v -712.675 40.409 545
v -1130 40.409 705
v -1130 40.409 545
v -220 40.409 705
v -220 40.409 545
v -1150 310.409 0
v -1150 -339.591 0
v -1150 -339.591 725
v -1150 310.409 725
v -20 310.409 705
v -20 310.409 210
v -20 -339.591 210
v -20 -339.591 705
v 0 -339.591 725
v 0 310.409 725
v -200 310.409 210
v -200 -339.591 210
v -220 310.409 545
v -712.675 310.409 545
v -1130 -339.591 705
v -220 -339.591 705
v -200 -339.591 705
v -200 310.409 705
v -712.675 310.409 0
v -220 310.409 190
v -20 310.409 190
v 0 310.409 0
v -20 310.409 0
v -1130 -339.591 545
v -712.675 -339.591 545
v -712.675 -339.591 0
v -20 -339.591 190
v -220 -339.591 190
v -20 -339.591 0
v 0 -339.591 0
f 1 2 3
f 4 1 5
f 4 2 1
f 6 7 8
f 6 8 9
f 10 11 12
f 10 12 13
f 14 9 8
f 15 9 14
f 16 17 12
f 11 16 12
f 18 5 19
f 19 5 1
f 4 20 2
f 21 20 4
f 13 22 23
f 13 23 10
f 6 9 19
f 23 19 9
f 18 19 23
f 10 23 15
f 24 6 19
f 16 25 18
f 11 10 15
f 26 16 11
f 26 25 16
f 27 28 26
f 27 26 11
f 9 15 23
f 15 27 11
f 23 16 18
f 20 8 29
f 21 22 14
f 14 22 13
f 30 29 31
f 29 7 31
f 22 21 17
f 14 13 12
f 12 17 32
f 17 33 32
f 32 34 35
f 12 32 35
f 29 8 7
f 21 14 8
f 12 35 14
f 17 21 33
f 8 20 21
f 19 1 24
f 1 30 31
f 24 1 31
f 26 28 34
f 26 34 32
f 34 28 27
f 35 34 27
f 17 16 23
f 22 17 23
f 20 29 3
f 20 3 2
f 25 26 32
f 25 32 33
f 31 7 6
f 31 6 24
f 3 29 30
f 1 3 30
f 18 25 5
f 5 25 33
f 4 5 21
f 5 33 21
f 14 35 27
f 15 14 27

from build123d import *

# Parameters (mm, degrees)
F0_W     = 1150
F0_H     = 650
F1_DEPTH = 725
F2_W     = 180
F2_H     = 495
F3_DEPTH = 650.001
F5_DEPTH = 650.001
F6_W     = 910
F6_H     = 160
F7_DEPTH = 380


with BuildPart() as f1:
    # F0 (on Top) → F1 (new body)
    with BuildSketch(Plane.XY):
        with Locations((-575, -14.591489)):
            Rectangle(F0_W, F0_H)
    extrude(amount=F1_DEPTH)

    # F2 (on face) → F3 (cut, through all)
    with BuildSketch(Plane.XZ.offset(339.591489)):
        with Locations((-110, 457.5)):
            Rectangle(F2_W, F2_H)
    extrude(amount=-F3_DEPTH, mode=Mode.SUBTRACT)

    # F4 (on face) → F5 (cut, through all)
    with BuildSketch(Plane.XZ.offset(339.591489)):
        Polygon((-220, 545), (-712.675017, 545), (-712.675017, 0), (-220, 0), (-20, 0), (-20, 190), (-220, 190), align=None)
    extrude(amount=-F5_DEPTH, mode=Mode.SUBTRACT)

    # F6 (on face) → F7 (cut)
    with BuildSketch(Plane.XZ.offset(339.591489)):
        with Locations((-675, 625)):
            Rectangle(F6_W, F6_H)
    extrude(amount=-F7_DEPTH, mode=Mode.SUBTRACT)


solid = f1.part
